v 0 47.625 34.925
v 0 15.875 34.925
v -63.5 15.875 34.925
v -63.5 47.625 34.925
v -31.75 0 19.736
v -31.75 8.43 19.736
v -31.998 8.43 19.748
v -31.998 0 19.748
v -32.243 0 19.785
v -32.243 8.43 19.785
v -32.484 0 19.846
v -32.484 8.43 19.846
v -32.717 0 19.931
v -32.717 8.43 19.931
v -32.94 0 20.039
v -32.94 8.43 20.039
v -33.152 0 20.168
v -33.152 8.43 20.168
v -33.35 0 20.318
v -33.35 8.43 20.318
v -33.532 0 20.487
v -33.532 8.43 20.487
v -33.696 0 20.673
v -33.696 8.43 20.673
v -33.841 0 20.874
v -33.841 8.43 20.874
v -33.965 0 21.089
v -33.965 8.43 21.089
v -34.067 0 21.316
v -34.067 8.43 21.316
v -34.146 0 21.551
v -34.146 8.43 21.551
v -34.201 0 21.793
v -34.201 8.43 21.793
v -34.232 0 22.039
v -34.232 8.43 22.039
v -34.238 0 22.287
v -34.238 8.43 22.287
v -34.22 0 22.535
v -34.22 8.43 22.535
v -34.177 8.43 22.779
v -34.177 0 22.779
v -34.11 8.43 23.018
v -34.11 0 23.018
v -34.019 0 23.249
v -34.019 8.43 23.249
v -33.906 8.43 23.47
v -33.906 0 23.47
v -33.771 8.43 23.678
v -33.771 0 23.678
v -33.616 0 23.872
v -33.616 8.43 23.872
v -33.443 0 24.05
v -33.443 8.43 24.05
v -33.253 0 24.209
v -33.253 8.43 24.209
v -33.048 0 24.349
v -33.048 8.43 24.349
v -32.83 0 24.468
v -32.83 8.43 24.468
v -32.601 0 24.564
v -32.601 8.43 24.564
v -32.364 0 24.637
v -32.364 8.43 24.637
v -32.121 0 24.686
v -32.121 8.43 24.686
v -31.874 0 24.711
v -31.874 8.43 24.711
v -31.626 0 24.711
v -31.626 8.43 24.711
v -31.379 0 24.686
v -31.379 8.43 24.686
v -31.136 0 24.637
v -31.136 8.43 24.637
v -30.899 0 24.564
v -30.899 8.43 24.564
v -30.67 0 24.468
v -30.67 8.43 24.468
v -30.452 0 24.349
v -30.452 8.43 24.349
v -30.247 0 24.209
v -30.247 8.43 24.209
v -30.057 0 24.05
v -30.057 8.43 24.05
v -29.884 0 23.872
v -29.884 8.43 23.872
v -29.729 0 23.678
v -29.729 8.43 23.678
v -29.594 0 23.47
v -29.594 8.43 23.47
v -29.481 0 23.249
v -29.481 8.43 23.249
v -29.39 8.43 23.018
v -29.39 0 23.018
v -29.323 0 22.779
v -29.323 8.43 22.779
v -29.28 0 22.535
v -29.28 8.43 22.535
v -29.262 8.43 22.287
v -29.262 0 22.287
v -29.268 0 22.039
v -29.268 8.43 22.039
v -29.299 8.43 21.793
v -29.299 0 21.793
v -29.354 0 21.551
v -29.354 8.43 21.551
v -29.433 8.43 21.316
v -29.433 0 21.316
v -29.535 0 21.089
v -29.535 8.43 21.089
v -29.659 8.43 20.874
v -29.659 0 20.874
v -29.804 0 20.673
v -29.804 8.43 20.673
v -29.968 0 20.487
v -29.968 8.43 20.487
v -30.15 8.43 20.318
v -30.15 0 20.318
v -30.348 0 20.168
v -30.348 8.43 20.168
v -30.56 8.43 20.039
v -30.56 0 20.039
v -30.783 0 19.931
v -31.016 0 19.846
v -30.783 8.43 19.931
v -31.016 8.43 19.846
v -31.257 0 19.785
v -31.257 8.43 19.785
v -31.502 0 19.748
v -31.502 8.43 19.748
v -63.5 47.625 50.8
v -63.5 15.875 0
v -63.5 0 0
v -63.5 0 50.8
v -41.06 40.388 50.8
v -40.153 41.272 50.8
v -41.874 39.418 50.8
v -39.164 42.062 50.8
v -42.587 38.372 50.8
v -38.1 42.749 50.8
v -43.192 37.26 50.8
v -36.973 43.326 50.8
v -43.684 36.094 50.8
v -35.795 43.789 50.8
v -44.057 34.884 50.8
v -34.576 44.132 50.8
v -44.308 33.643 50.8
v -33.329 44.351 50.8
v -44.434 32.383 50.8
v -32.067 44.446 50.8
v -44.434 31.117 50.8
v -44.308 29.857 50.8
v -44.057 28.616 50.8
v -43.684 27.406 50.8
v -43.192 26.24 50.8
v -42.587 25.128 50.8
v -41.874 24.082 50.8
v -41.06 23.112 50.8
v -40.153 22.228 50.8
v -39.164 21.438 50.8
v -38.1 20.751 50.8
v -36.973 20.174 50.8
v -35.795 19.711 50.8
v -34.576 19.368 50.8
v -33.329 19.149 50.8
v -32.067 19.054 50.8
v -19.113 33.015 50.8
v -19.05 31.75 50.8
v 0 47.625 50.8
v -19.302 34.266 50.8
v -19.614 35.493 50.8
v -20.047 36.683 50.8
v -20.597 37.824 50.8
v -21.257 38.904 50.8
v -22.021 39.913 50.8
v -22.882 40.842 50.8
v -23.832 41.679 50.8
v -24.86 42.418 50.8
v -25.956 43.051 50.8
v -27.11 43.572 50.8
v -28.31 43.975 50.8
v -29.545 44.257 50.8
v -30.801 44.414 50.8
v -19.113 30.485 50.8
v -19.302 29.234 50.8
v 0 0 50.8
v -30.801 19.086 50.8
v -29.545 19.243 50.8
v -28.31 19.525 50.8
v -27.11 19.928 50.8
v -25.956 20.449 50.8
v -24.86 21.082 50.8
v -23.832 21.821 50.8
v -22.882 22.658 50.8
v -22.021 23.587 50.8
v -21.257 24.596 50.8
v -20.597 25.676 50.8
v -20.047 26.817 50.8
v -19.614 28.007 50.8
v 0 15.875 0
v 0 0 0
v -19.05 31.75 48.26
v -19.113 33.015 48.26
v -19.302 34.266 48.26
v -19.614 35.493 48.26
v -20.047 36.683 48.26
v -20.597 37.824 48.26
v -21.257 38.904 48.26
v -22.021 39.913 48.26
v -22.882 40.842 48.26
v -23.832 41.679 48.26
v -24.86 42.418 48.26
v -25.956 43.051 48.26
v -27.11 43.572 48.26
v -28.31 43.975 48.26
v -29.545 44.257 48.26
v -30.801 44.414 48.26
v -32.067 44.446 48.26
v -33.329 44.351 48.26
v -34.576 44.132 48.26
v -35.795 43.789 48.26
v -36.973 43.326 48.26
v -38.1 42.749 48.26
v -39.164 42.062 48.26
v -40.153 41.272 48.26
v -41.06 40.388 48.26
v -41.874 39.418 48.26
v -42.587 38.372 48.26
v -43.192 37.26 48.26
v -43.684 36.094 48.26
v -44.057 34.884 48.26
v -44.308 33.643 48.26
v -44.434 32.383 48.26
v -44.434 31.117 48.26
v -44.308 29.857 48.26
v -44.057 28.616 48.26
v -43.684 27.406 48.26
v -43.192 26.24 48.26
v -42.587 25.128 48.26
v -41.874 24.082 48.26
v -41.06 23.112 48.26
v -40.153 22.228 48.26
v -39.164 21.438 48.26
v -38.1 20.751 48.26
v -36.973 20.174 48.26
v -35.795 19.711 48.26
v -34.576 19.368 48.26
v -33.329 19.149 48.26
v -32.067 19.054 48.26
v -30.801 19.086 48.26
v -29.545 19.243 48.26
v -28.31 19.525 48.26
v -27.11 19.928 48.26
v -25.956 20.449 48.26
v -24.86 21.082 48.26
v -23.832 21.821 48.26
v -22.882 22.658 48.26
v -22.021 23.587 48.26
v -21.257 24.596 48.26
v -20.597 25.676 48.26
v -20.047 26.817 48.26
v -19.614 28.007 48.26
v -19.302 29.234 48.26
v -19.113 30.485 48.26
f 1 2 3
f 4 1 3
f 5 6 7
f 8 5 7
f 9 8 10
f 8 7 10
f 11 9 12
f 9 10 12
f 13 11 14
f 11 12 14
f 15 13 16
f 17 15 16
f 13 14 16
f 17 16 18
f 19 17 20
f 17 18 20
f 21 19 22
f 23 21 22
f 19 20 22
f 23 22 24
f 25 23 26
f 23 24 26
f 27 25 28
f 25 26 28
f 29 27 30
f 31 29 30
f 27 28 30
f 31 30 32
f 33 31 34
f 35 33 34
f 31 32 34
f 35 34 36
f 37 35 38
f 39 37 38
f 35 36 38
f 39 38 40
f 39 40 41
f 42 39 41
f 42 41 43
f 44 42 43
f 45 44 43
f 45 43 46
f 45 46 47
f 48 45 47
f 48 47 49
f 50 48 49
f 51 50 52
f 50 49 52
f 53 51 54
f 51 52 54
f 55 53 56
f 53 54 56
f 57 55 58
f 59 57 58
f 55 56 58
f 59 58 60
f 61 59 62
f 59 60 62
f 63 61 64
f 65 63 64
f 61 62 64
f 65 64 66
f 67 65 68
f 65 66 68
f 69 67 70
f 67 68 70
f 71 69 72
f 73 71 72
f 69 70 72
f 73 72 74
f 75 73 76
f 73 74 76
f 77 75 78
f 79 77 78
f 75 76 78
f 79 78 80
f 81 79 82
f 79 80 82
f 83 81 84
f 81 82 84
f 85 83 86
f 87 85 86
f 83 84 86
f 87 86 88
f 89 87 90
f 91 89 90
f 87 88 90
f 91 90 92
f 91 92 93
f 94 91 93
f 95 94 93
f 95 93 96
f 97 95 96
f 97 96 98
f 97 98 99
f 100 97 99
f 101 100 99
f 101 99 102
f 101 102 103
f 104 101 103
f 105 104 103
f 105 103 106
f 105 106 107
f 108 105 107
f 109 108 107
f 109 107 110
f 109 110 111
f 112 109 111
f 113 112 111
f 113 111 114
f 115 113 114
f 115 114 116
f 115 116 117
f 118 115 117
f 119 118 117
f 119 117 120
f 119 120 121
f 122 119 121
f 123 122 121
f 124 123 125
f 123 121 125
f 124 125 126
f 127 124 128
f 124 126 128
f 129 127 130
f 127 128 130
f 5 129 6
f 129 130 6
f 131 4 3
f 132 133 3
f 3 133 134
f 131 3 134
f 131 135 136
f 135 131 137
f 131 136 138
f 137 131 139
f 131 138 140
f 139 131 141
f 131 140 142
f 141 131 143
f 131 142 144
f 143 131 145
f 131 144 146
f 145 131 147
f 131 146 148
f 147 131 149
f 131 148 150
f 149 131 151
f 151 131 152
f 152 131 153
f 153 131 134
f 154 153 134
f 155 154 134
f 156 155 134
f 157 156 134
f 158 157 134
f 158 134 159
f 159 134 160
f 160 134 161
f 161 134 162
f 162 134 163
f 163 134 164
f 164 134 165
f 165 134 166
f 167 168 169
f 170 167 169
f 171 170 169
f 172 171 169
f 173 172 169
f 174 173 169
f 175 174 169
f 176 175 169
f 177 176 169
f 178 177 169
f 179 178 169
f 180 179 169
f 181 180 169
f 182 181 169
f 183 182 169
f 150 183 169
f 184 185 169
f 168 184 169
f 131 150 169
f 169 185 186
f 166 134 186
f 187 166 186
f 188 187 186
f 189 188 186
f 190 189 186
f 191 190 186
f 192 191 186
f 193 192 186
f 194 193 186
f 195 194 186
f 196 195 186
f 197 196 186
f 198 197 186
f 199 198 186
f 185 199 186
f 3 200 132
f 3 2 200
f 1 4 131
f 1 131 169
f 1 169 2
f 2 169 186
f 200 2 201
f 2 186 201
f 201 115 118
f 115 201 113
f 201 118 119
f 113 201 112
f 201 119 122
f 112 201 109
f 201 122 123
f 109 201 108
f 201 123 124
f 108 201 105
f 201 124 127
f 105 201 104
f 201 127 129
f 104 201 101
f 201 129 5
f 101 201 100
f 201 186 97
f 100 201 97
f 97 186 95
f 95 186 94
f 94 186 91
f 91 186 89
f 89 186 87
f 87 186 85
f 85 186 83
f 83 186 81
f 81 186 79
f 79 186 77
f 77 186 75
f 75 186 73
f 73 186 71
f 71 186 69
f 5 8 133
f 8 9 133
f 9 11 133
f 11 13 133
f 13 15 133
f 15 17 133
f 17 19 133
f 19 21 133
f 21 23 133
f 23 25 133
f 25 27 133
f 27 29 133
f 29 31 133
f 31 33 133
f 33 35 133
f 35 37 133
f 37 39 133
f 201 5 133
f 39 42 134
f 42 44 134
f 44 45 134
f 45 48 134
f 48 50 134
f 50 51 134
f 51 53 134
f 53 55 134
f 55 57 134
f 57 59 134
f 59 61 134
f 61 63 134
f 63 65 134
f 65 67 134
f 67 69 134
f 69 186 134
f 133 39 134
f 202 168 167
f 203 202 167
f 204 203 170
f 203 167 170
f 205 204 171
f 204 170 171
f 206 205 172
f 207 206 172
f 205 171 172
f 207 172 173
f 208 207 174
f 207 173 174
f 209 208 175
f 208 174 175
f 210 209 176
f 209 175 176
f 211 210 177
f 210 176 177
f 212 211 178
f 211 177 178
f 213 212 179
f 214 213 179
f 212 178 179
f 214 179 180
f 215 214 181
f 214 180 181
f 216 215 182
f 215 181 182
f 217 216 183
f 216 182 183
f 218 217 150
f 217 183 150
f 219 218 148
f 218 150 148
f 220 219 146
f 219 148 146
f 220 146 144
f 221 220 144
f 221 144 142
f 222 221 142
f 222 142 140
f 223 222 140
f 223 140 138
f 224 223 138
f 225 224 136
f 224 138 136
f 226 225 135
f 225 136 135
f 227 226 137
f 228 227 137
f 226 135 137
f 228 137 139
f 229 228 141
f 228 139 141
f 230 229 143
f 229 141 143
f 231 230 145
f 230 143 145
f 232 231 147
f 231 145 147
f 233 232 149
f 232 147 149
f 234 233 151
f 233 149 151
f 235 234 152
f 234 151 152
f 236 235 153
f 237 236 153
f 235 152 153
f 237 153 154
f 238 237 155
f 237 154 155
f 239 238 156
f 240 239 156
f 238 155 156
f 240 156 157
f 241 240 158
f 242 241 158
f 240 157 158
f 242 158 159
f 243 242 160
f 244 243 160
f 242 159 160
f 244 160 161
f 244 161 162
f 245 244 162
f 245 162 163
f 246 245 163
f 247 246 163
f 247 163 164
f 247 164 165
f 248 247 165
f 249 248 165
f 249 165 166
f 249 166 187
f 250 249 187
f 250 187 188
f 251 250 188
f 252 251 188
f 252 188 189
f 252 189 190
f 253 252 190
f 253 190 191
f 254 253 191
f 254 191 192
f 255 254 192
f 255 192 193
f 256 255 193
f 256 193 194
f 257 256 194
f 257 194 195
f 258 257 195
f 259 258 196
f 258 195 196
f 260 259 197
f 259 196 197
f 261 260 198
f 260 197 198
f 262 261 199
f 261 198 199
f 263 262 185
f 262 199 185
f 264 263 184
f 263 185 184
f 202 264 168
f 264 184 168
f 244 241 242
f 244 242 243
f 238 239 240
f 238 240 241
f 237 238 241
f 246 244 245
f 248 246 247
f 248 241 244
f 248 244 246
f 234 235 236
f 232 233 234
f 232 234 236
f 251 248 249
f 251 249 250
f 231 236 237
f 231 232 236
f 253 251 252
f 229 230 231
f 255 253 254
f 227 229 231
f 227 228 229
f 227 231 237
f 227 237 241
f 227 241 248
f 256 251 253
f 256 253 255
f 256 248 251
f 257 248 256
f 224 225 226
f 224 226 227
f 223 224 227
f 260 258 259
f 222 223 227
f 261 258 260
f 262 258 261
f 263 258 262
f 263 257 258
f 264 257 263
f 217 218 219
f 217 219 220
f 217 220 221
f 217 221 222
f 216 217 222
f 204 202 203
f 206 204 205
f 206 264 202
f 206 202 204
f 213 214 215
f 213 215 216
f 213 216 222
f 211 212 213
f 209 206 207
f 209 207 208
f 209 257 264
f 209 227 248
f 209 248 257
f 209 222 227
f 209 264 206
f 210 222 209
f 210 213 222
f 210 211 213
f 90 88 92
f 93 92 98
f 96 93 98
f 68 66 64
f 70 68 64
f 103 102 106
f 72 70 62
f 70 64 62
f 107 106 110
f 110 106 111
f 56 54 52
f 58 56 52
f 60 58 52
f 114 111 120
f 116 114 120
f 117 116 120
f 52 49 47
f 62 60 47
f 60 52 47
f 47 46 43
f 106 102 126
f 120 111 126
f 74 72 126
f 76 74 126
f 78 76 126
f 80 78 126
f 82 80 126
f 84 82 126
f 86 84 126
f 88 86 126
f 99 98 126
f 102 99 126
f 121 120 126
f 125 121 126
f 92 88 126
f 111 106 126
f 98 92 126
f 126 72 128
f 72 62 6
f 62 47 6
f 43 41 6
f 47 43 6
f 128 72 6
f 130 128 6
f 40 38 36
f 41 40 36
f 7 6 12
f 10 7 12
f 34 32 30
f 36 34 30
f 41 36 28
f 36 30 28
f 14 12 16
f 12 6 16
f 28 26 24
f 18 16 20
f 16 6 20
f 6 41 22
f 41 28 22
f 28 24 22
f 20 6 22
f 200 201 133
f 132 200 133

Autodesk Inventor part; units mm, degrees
ref_plane "YZ Plane" through (0, 0, 0) normal (1, 0, 0) x (0, 1, 0)
ref_plane "XZ Plane" through (0, 0, 0) normal (0, 1, 0) x (-1, 0, 0)
ref_plane "XY Plane" through (0, 0, 0) normal (0, 0, 1) x (1, 0, 0)
sketch "Sketch1" plane through (0, 0, 0) normal (0, 1, 0) x (-1, 0, 0)
  line L0 (0, 0) -> (63.5, 0)
  line L1 (63.5, 0) -> (63.5, 50.8)
  line L2 (63.5, 50.8) -> (0, 50.8)
  line L3 (0, 50.8) -> (0, 0)
  dimension "cameraWidth" = 63.5
  dimension "cameraDepth" = 50.8
extrude "Extrusion1" add sketch "Sketch1" along normal blind 15.875
sketch "Sketch2" plane through (0, 15.875, 0) normal (0, 1, 0) x (1, 0, 0)
  line L0 (0, -50.8) -> (0, 0) projected
  line L1 (-63.5, -50.8) -> (0, -50.8)
  line L2 (0, -50.8) -> (0, -34.925)
  line L3 (0, -34.925) -> (-63.5, -34.925)
  line L4 (-63.5, -34.925) -> (-63.5, -50.8)
  dimension "d4" = 15.875
extrude "Extrusion2" add sketch "Sketch2" along normal blind 31.75
sketch "Sketch3" plane through (-63.5, 0, 50.8) normal (0, 0, 1) x (1, 0, 0)
  line L0 (0, 0) -> (63.5, 0) projected
  line L1 (0, 0) -> (0, 47.625) projected
  circle A0 centre (31.75, 31.75) radius 12.7
  dimension "d7" = 31.75
  dimension "cameraLensHeight" = 31.75
  dimension "d9" = 25.4
extrude "Extrusion3" cut sketch "Sketch3" against normal blind 2.54
sketch "Sketch4" plane through (-63.5, 0, 50.8) normal (0, 0, 1) x (1, 0, 0)
  circle A0 centre (31.75, 31.75) radius 12.7 projected
  line L0 (0, 0) -> (63.5, 0) projected
  line L1 (63.5, 0) -> (63.5, 47.625) projected
  line L2 (0, 47.625) -> (63.5, 47.625) projected
  line L3 (0, 0) -> (0, 47.625) projected
  line L4 (0, 31.75) -> (63.5, 31.75)
  line L5 (31.75, 47.625) -> (31.75, 0)
  dimension "d12" = 31.75
sketch "Sketch5" plane through (0, 0, 0) normal (0, -1, 0) x (1, 0, 0)
  line L0 (0, 0) -> (-63.5, 0) projected
  line L1 (0, 50.8) -> (0, 0) projected
  line L2 (-63.5, 50.8) -> (0, 50.8) projected
  line L3 (-63.5, 0) -> (-63.5, 50.8) projected
  line L4 (-63.5, 22.225) -> (0, 22.225)
  line L5 (-31.75, 50.8) -> (-31.75, 0)
  circle A0 centre (-31.75, 22.225) radius 7.8401
  dimension "cameraMountingHoleDistanceFromFront" = 28.575
hole "Hole1" at (-31.75, 0, 22.225) direction (0, 1, 0) diameter 4.9784 depth 8.43 thread size "1/4-20 UNC" class "2B" standard "ANSI Unified Screw Threads"
equation "\"d7\" = 0.5 * cameraWidth"
equation "\"d12\" = cameraLensHeight"
properties part number "camera"
